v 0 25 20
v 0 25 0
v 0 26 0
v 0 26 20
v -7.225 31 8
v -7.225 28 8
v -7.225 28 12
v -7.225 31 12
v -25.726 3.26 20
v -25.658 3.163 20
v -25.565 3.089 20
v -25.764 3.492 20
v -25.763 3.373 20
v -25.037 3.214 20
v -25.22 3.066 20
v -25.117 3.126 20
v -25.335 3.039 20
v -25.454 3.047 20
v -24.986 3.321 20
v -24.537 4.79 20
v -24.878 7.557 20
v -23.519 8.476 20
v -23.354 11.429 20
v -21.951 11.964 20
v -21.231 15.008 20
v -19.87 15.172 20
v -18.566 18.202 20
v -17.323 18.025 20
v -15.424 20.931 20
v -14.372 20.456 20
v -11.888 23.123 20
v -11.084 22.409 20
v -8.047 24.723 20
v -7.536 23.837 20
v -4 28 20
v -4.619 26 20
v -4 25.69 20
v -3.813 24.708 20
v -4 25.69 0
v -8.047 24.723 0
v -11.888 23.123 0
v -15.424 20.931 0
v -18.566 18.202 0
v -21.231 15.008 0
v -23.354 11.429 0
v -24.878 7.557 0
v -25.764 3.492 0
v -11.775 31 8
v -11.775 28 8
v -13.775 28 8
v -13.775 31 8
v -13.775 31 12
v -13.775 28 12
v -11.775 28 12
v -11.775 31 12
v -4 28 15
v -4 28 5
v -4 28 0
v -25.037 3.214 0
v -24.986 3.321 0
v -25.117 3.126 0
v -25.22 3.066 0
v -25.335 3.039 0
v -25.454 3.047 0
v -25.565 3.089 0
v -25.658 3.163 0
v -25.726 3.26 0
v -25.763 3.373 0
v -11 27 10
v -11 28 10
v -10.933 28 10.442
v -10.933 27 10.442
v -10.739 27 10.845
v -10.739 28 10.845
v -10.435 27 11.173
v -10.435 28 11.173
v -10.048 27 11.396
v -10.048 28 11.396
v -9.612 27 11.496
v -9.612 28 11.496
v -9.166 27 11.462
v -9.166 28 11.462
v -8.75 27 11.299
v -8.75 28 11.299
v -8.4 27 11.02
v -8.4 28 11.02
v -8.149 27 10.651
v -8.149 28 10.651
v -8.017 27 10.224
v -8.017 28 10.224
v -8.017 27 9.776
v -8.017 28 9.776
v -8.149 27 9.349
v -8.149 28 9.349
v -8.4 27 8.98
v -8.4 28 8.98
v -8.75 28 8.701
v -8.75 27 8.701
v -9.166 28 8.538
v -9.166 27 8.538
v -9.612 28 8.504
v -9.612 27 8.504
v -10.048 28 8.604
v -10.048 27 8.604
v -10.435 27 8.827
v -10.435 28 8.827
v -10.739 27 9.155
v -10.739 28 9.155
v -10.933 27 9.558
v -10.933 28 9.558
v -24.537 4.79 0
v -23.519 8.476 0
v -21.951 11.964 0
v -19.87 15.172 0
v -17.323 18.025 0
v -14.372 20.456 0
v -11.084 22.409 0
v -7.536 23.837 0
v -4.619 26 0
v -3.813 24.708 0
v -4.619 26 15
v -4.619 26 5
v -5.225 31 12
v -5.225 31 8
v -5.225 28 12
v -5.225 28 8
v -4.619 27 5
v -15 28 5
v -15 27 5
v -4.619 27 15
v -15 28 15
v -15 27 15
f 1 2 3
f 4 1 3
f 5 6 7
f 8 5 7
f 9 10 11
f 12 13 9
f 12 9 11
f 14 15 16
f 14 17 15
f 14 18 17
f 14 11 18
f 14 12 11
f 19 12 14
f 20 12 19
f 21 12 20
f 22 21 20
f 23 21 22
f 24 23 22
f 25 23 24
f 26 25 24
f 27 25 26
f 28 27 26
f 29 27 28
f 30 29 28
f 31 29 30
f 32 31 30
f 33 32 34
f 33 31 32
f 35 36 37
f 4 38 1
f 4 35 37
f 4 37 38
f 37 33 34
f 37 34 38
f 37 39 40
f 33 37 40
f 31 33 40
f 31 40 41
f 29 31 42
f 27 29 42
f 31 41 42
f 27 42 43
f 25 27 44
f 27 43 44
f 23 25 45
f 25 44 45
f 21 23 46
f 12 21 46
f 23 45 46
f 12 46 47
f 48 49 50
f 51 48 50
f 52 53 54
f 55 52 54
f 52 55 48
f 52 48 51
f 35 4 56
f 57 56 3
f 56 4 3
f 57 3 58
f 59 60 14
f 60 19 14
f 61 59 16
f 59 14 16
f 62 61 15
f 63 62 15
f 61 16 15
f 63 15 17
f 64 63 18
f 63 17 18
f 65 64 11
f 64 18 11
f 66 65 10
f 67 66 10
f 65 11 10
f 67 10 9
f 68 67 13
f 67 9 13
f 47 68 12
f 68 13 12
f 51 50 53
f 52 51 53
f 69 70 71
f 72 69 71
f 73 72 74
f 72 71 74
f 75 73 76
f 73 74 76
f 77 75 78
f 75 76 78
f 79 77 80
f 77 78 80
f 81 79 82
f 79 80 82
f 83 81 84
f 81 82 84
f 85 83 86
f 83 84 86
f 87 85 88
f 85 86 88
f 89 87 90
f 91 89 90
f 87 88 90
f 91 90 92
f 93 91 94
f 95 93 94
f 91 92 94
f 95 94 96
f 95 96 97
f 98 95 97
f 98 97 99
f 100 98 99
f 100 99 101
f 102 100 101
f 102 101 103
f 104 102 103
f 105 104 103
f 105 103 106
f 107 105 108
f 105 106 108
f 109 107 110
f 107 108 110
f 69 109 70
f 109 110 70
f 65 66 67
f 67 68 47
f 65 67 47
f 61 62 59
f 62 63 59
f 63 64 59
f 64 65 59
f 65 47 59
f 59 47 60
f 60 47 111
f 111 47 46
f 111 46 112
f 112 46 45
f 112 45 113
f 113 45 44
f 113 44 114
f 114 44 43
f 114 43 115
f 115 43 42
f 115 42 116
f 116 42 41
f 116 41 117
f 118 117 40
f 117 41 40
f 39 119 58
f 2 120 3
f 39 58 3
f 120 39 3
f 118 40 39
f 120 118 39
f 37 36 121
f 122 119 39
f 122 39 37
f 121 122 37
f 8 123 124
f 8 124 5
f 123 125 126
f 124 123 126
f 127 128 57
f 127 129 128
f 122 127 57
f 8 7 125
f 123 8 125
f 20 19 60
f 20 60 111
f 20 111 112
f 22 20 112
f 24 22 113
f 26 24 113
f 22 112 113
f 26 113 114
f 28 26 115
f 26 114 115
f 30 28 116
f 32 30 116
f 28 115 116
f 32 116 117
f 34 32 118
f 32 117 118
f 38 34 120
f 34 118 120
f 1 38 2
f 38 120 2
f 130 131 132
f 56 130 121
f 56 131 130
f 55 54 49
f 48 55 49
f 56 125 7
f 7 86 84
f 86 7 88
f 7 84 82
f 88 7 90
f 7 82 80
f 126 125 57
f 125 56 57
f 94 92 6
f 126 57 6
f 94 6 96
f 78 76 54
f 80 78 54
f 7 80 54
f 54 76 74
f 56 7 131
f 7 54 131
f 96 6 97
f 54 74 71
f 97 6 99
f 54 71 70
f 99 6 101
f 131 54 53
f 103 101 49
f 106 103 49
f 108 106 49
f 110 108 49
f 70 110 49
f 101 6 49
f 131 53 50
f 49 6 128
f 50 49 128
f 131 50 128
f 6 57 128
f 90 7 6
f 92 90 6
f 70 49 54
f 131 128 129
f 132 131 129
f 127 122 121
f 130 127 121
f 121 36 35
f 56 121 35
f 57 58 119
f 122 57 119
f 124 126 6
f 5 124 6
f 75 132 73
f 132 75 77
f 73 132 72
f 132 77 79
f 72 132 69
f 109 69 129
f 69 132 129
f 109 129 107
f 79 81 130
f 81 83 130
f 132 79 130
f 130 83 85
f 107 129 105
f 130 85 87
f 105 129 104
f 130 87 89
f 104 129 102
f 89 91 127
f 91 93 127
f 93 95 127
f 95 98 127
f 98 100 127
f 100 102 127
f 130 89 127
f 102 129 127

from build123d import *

# Parameters (mm, degrees)
F1_DEPTH  = 20
F3_DEPTH  = 5
F5_DEPTH  = 5
F8_DEPTH  = 3
F9_DEPTH  = 1
F6_R      = 1.5
F10_DEPTH = 1
F11_R     = 0.4


with BuildPart() as f1:
    # F0 (on Top) → F1 (new body)
    with BuildSketch(Plane.XY):
        with BuildLine():
            ThreePointArc((-24.5367908878, 4.7901871498), (-15.894107733, 19.2970811102), (0, 25))
            Line((0, 25), (0, 26))
            Line((0, 26), (-4, 27.9999999299))
            Line((-4, 27.9999999299), (-5.9999998598, 27.9999999299))
            Line((-5.9999998598, 27.9999999299), (-7.9999998598, 27.9999999299))
            Line((-7.9999998598, 27.9999999299), (-15, 27.9999999299))
            Line((-15, 27.9999999299), (-15, 26))
            Line((-15, 26), (-4.6190696853, 26))
            Line((-4.6190696853, 26), (-4, 25.6904651573))
            ThreePointArc((-4, 25.6904651573), (-19.7484176581, 16.9115345253), (-26, 0))
            Line((-26, 0), (-24.5367908878, 4.7901871498))
        make_face()
    extrude(amount=F1_DEPTH)

    # F2 (on face) → F3 (cut)
    with BuildSketch(Plane.XY.offset(20)):
        Polygon((-15, 26), (-4.6190696853, 26), (-4, 27.9999999299), (-15, 27.9999999299), align=None)
    extrude(amount=-F3_DEPTH, mode=Mode.SUBTRACT)

    # F4 (on face) → F5 (cut)
    with BuildSketch(Plane(origin=(0, 0, 0), x_dir=(1, 0, 0), z_dir=(0, 0, -1))):
        Polygon((-4, -27.9999999299), (-4.6190696853, -26), (-15, -26), (-15, -27.9999999299), align=None)
    extrude(amount=-F5_DEPTH, mode=Mode.SUBTRACT)

    # F7 (on face) → F8 (join)
    with BuildSketch(Plane(origin=(0, 27.9999999299, 0), x_dir=(-1, 0, 0), z_dir=(0, 1, 0))):
        Polygon((11.775, 12), (11.775, 10), (11.775, 8), (13.775, 8), (13.775, 12), align=None)
        Polygon((7.225, 10), (7.225, 12), (5.225, 12), (5.225, 8), (7.225, 8), align=None)
    extrude(amount=F8_DEPTH)

    # F9 (cut): a face of the model
    f9_faces = [f1.faces().sort_by_distance(p)[0] for p in [
        (-9.8095348427, 26, 10),
    ]]
    extrude(f9_faces, amount=-F9_DEPTH, mode=Mode.SUBTRACT)

    # F6 (on face) → F10 (cut)
    with BuildSketch(Plane(origin=(0, 27.9999999299, 0), x_dir=(-1, 0, 0), z_dir=(0, 1, 0))):
        with Locations((9.5, 10)):
            Circle(F6_R)
    extrude(amount=-F10_DEPTH, mode=Mode.SUBTRACT)

    # F11
    f11_edges = [f1.edges().sort_by_distance(p)[0] for p in [
        (-26, 0, 10),
    ]]
    fillet(f11_edges, radius=F11_R)


solid = f1.part
